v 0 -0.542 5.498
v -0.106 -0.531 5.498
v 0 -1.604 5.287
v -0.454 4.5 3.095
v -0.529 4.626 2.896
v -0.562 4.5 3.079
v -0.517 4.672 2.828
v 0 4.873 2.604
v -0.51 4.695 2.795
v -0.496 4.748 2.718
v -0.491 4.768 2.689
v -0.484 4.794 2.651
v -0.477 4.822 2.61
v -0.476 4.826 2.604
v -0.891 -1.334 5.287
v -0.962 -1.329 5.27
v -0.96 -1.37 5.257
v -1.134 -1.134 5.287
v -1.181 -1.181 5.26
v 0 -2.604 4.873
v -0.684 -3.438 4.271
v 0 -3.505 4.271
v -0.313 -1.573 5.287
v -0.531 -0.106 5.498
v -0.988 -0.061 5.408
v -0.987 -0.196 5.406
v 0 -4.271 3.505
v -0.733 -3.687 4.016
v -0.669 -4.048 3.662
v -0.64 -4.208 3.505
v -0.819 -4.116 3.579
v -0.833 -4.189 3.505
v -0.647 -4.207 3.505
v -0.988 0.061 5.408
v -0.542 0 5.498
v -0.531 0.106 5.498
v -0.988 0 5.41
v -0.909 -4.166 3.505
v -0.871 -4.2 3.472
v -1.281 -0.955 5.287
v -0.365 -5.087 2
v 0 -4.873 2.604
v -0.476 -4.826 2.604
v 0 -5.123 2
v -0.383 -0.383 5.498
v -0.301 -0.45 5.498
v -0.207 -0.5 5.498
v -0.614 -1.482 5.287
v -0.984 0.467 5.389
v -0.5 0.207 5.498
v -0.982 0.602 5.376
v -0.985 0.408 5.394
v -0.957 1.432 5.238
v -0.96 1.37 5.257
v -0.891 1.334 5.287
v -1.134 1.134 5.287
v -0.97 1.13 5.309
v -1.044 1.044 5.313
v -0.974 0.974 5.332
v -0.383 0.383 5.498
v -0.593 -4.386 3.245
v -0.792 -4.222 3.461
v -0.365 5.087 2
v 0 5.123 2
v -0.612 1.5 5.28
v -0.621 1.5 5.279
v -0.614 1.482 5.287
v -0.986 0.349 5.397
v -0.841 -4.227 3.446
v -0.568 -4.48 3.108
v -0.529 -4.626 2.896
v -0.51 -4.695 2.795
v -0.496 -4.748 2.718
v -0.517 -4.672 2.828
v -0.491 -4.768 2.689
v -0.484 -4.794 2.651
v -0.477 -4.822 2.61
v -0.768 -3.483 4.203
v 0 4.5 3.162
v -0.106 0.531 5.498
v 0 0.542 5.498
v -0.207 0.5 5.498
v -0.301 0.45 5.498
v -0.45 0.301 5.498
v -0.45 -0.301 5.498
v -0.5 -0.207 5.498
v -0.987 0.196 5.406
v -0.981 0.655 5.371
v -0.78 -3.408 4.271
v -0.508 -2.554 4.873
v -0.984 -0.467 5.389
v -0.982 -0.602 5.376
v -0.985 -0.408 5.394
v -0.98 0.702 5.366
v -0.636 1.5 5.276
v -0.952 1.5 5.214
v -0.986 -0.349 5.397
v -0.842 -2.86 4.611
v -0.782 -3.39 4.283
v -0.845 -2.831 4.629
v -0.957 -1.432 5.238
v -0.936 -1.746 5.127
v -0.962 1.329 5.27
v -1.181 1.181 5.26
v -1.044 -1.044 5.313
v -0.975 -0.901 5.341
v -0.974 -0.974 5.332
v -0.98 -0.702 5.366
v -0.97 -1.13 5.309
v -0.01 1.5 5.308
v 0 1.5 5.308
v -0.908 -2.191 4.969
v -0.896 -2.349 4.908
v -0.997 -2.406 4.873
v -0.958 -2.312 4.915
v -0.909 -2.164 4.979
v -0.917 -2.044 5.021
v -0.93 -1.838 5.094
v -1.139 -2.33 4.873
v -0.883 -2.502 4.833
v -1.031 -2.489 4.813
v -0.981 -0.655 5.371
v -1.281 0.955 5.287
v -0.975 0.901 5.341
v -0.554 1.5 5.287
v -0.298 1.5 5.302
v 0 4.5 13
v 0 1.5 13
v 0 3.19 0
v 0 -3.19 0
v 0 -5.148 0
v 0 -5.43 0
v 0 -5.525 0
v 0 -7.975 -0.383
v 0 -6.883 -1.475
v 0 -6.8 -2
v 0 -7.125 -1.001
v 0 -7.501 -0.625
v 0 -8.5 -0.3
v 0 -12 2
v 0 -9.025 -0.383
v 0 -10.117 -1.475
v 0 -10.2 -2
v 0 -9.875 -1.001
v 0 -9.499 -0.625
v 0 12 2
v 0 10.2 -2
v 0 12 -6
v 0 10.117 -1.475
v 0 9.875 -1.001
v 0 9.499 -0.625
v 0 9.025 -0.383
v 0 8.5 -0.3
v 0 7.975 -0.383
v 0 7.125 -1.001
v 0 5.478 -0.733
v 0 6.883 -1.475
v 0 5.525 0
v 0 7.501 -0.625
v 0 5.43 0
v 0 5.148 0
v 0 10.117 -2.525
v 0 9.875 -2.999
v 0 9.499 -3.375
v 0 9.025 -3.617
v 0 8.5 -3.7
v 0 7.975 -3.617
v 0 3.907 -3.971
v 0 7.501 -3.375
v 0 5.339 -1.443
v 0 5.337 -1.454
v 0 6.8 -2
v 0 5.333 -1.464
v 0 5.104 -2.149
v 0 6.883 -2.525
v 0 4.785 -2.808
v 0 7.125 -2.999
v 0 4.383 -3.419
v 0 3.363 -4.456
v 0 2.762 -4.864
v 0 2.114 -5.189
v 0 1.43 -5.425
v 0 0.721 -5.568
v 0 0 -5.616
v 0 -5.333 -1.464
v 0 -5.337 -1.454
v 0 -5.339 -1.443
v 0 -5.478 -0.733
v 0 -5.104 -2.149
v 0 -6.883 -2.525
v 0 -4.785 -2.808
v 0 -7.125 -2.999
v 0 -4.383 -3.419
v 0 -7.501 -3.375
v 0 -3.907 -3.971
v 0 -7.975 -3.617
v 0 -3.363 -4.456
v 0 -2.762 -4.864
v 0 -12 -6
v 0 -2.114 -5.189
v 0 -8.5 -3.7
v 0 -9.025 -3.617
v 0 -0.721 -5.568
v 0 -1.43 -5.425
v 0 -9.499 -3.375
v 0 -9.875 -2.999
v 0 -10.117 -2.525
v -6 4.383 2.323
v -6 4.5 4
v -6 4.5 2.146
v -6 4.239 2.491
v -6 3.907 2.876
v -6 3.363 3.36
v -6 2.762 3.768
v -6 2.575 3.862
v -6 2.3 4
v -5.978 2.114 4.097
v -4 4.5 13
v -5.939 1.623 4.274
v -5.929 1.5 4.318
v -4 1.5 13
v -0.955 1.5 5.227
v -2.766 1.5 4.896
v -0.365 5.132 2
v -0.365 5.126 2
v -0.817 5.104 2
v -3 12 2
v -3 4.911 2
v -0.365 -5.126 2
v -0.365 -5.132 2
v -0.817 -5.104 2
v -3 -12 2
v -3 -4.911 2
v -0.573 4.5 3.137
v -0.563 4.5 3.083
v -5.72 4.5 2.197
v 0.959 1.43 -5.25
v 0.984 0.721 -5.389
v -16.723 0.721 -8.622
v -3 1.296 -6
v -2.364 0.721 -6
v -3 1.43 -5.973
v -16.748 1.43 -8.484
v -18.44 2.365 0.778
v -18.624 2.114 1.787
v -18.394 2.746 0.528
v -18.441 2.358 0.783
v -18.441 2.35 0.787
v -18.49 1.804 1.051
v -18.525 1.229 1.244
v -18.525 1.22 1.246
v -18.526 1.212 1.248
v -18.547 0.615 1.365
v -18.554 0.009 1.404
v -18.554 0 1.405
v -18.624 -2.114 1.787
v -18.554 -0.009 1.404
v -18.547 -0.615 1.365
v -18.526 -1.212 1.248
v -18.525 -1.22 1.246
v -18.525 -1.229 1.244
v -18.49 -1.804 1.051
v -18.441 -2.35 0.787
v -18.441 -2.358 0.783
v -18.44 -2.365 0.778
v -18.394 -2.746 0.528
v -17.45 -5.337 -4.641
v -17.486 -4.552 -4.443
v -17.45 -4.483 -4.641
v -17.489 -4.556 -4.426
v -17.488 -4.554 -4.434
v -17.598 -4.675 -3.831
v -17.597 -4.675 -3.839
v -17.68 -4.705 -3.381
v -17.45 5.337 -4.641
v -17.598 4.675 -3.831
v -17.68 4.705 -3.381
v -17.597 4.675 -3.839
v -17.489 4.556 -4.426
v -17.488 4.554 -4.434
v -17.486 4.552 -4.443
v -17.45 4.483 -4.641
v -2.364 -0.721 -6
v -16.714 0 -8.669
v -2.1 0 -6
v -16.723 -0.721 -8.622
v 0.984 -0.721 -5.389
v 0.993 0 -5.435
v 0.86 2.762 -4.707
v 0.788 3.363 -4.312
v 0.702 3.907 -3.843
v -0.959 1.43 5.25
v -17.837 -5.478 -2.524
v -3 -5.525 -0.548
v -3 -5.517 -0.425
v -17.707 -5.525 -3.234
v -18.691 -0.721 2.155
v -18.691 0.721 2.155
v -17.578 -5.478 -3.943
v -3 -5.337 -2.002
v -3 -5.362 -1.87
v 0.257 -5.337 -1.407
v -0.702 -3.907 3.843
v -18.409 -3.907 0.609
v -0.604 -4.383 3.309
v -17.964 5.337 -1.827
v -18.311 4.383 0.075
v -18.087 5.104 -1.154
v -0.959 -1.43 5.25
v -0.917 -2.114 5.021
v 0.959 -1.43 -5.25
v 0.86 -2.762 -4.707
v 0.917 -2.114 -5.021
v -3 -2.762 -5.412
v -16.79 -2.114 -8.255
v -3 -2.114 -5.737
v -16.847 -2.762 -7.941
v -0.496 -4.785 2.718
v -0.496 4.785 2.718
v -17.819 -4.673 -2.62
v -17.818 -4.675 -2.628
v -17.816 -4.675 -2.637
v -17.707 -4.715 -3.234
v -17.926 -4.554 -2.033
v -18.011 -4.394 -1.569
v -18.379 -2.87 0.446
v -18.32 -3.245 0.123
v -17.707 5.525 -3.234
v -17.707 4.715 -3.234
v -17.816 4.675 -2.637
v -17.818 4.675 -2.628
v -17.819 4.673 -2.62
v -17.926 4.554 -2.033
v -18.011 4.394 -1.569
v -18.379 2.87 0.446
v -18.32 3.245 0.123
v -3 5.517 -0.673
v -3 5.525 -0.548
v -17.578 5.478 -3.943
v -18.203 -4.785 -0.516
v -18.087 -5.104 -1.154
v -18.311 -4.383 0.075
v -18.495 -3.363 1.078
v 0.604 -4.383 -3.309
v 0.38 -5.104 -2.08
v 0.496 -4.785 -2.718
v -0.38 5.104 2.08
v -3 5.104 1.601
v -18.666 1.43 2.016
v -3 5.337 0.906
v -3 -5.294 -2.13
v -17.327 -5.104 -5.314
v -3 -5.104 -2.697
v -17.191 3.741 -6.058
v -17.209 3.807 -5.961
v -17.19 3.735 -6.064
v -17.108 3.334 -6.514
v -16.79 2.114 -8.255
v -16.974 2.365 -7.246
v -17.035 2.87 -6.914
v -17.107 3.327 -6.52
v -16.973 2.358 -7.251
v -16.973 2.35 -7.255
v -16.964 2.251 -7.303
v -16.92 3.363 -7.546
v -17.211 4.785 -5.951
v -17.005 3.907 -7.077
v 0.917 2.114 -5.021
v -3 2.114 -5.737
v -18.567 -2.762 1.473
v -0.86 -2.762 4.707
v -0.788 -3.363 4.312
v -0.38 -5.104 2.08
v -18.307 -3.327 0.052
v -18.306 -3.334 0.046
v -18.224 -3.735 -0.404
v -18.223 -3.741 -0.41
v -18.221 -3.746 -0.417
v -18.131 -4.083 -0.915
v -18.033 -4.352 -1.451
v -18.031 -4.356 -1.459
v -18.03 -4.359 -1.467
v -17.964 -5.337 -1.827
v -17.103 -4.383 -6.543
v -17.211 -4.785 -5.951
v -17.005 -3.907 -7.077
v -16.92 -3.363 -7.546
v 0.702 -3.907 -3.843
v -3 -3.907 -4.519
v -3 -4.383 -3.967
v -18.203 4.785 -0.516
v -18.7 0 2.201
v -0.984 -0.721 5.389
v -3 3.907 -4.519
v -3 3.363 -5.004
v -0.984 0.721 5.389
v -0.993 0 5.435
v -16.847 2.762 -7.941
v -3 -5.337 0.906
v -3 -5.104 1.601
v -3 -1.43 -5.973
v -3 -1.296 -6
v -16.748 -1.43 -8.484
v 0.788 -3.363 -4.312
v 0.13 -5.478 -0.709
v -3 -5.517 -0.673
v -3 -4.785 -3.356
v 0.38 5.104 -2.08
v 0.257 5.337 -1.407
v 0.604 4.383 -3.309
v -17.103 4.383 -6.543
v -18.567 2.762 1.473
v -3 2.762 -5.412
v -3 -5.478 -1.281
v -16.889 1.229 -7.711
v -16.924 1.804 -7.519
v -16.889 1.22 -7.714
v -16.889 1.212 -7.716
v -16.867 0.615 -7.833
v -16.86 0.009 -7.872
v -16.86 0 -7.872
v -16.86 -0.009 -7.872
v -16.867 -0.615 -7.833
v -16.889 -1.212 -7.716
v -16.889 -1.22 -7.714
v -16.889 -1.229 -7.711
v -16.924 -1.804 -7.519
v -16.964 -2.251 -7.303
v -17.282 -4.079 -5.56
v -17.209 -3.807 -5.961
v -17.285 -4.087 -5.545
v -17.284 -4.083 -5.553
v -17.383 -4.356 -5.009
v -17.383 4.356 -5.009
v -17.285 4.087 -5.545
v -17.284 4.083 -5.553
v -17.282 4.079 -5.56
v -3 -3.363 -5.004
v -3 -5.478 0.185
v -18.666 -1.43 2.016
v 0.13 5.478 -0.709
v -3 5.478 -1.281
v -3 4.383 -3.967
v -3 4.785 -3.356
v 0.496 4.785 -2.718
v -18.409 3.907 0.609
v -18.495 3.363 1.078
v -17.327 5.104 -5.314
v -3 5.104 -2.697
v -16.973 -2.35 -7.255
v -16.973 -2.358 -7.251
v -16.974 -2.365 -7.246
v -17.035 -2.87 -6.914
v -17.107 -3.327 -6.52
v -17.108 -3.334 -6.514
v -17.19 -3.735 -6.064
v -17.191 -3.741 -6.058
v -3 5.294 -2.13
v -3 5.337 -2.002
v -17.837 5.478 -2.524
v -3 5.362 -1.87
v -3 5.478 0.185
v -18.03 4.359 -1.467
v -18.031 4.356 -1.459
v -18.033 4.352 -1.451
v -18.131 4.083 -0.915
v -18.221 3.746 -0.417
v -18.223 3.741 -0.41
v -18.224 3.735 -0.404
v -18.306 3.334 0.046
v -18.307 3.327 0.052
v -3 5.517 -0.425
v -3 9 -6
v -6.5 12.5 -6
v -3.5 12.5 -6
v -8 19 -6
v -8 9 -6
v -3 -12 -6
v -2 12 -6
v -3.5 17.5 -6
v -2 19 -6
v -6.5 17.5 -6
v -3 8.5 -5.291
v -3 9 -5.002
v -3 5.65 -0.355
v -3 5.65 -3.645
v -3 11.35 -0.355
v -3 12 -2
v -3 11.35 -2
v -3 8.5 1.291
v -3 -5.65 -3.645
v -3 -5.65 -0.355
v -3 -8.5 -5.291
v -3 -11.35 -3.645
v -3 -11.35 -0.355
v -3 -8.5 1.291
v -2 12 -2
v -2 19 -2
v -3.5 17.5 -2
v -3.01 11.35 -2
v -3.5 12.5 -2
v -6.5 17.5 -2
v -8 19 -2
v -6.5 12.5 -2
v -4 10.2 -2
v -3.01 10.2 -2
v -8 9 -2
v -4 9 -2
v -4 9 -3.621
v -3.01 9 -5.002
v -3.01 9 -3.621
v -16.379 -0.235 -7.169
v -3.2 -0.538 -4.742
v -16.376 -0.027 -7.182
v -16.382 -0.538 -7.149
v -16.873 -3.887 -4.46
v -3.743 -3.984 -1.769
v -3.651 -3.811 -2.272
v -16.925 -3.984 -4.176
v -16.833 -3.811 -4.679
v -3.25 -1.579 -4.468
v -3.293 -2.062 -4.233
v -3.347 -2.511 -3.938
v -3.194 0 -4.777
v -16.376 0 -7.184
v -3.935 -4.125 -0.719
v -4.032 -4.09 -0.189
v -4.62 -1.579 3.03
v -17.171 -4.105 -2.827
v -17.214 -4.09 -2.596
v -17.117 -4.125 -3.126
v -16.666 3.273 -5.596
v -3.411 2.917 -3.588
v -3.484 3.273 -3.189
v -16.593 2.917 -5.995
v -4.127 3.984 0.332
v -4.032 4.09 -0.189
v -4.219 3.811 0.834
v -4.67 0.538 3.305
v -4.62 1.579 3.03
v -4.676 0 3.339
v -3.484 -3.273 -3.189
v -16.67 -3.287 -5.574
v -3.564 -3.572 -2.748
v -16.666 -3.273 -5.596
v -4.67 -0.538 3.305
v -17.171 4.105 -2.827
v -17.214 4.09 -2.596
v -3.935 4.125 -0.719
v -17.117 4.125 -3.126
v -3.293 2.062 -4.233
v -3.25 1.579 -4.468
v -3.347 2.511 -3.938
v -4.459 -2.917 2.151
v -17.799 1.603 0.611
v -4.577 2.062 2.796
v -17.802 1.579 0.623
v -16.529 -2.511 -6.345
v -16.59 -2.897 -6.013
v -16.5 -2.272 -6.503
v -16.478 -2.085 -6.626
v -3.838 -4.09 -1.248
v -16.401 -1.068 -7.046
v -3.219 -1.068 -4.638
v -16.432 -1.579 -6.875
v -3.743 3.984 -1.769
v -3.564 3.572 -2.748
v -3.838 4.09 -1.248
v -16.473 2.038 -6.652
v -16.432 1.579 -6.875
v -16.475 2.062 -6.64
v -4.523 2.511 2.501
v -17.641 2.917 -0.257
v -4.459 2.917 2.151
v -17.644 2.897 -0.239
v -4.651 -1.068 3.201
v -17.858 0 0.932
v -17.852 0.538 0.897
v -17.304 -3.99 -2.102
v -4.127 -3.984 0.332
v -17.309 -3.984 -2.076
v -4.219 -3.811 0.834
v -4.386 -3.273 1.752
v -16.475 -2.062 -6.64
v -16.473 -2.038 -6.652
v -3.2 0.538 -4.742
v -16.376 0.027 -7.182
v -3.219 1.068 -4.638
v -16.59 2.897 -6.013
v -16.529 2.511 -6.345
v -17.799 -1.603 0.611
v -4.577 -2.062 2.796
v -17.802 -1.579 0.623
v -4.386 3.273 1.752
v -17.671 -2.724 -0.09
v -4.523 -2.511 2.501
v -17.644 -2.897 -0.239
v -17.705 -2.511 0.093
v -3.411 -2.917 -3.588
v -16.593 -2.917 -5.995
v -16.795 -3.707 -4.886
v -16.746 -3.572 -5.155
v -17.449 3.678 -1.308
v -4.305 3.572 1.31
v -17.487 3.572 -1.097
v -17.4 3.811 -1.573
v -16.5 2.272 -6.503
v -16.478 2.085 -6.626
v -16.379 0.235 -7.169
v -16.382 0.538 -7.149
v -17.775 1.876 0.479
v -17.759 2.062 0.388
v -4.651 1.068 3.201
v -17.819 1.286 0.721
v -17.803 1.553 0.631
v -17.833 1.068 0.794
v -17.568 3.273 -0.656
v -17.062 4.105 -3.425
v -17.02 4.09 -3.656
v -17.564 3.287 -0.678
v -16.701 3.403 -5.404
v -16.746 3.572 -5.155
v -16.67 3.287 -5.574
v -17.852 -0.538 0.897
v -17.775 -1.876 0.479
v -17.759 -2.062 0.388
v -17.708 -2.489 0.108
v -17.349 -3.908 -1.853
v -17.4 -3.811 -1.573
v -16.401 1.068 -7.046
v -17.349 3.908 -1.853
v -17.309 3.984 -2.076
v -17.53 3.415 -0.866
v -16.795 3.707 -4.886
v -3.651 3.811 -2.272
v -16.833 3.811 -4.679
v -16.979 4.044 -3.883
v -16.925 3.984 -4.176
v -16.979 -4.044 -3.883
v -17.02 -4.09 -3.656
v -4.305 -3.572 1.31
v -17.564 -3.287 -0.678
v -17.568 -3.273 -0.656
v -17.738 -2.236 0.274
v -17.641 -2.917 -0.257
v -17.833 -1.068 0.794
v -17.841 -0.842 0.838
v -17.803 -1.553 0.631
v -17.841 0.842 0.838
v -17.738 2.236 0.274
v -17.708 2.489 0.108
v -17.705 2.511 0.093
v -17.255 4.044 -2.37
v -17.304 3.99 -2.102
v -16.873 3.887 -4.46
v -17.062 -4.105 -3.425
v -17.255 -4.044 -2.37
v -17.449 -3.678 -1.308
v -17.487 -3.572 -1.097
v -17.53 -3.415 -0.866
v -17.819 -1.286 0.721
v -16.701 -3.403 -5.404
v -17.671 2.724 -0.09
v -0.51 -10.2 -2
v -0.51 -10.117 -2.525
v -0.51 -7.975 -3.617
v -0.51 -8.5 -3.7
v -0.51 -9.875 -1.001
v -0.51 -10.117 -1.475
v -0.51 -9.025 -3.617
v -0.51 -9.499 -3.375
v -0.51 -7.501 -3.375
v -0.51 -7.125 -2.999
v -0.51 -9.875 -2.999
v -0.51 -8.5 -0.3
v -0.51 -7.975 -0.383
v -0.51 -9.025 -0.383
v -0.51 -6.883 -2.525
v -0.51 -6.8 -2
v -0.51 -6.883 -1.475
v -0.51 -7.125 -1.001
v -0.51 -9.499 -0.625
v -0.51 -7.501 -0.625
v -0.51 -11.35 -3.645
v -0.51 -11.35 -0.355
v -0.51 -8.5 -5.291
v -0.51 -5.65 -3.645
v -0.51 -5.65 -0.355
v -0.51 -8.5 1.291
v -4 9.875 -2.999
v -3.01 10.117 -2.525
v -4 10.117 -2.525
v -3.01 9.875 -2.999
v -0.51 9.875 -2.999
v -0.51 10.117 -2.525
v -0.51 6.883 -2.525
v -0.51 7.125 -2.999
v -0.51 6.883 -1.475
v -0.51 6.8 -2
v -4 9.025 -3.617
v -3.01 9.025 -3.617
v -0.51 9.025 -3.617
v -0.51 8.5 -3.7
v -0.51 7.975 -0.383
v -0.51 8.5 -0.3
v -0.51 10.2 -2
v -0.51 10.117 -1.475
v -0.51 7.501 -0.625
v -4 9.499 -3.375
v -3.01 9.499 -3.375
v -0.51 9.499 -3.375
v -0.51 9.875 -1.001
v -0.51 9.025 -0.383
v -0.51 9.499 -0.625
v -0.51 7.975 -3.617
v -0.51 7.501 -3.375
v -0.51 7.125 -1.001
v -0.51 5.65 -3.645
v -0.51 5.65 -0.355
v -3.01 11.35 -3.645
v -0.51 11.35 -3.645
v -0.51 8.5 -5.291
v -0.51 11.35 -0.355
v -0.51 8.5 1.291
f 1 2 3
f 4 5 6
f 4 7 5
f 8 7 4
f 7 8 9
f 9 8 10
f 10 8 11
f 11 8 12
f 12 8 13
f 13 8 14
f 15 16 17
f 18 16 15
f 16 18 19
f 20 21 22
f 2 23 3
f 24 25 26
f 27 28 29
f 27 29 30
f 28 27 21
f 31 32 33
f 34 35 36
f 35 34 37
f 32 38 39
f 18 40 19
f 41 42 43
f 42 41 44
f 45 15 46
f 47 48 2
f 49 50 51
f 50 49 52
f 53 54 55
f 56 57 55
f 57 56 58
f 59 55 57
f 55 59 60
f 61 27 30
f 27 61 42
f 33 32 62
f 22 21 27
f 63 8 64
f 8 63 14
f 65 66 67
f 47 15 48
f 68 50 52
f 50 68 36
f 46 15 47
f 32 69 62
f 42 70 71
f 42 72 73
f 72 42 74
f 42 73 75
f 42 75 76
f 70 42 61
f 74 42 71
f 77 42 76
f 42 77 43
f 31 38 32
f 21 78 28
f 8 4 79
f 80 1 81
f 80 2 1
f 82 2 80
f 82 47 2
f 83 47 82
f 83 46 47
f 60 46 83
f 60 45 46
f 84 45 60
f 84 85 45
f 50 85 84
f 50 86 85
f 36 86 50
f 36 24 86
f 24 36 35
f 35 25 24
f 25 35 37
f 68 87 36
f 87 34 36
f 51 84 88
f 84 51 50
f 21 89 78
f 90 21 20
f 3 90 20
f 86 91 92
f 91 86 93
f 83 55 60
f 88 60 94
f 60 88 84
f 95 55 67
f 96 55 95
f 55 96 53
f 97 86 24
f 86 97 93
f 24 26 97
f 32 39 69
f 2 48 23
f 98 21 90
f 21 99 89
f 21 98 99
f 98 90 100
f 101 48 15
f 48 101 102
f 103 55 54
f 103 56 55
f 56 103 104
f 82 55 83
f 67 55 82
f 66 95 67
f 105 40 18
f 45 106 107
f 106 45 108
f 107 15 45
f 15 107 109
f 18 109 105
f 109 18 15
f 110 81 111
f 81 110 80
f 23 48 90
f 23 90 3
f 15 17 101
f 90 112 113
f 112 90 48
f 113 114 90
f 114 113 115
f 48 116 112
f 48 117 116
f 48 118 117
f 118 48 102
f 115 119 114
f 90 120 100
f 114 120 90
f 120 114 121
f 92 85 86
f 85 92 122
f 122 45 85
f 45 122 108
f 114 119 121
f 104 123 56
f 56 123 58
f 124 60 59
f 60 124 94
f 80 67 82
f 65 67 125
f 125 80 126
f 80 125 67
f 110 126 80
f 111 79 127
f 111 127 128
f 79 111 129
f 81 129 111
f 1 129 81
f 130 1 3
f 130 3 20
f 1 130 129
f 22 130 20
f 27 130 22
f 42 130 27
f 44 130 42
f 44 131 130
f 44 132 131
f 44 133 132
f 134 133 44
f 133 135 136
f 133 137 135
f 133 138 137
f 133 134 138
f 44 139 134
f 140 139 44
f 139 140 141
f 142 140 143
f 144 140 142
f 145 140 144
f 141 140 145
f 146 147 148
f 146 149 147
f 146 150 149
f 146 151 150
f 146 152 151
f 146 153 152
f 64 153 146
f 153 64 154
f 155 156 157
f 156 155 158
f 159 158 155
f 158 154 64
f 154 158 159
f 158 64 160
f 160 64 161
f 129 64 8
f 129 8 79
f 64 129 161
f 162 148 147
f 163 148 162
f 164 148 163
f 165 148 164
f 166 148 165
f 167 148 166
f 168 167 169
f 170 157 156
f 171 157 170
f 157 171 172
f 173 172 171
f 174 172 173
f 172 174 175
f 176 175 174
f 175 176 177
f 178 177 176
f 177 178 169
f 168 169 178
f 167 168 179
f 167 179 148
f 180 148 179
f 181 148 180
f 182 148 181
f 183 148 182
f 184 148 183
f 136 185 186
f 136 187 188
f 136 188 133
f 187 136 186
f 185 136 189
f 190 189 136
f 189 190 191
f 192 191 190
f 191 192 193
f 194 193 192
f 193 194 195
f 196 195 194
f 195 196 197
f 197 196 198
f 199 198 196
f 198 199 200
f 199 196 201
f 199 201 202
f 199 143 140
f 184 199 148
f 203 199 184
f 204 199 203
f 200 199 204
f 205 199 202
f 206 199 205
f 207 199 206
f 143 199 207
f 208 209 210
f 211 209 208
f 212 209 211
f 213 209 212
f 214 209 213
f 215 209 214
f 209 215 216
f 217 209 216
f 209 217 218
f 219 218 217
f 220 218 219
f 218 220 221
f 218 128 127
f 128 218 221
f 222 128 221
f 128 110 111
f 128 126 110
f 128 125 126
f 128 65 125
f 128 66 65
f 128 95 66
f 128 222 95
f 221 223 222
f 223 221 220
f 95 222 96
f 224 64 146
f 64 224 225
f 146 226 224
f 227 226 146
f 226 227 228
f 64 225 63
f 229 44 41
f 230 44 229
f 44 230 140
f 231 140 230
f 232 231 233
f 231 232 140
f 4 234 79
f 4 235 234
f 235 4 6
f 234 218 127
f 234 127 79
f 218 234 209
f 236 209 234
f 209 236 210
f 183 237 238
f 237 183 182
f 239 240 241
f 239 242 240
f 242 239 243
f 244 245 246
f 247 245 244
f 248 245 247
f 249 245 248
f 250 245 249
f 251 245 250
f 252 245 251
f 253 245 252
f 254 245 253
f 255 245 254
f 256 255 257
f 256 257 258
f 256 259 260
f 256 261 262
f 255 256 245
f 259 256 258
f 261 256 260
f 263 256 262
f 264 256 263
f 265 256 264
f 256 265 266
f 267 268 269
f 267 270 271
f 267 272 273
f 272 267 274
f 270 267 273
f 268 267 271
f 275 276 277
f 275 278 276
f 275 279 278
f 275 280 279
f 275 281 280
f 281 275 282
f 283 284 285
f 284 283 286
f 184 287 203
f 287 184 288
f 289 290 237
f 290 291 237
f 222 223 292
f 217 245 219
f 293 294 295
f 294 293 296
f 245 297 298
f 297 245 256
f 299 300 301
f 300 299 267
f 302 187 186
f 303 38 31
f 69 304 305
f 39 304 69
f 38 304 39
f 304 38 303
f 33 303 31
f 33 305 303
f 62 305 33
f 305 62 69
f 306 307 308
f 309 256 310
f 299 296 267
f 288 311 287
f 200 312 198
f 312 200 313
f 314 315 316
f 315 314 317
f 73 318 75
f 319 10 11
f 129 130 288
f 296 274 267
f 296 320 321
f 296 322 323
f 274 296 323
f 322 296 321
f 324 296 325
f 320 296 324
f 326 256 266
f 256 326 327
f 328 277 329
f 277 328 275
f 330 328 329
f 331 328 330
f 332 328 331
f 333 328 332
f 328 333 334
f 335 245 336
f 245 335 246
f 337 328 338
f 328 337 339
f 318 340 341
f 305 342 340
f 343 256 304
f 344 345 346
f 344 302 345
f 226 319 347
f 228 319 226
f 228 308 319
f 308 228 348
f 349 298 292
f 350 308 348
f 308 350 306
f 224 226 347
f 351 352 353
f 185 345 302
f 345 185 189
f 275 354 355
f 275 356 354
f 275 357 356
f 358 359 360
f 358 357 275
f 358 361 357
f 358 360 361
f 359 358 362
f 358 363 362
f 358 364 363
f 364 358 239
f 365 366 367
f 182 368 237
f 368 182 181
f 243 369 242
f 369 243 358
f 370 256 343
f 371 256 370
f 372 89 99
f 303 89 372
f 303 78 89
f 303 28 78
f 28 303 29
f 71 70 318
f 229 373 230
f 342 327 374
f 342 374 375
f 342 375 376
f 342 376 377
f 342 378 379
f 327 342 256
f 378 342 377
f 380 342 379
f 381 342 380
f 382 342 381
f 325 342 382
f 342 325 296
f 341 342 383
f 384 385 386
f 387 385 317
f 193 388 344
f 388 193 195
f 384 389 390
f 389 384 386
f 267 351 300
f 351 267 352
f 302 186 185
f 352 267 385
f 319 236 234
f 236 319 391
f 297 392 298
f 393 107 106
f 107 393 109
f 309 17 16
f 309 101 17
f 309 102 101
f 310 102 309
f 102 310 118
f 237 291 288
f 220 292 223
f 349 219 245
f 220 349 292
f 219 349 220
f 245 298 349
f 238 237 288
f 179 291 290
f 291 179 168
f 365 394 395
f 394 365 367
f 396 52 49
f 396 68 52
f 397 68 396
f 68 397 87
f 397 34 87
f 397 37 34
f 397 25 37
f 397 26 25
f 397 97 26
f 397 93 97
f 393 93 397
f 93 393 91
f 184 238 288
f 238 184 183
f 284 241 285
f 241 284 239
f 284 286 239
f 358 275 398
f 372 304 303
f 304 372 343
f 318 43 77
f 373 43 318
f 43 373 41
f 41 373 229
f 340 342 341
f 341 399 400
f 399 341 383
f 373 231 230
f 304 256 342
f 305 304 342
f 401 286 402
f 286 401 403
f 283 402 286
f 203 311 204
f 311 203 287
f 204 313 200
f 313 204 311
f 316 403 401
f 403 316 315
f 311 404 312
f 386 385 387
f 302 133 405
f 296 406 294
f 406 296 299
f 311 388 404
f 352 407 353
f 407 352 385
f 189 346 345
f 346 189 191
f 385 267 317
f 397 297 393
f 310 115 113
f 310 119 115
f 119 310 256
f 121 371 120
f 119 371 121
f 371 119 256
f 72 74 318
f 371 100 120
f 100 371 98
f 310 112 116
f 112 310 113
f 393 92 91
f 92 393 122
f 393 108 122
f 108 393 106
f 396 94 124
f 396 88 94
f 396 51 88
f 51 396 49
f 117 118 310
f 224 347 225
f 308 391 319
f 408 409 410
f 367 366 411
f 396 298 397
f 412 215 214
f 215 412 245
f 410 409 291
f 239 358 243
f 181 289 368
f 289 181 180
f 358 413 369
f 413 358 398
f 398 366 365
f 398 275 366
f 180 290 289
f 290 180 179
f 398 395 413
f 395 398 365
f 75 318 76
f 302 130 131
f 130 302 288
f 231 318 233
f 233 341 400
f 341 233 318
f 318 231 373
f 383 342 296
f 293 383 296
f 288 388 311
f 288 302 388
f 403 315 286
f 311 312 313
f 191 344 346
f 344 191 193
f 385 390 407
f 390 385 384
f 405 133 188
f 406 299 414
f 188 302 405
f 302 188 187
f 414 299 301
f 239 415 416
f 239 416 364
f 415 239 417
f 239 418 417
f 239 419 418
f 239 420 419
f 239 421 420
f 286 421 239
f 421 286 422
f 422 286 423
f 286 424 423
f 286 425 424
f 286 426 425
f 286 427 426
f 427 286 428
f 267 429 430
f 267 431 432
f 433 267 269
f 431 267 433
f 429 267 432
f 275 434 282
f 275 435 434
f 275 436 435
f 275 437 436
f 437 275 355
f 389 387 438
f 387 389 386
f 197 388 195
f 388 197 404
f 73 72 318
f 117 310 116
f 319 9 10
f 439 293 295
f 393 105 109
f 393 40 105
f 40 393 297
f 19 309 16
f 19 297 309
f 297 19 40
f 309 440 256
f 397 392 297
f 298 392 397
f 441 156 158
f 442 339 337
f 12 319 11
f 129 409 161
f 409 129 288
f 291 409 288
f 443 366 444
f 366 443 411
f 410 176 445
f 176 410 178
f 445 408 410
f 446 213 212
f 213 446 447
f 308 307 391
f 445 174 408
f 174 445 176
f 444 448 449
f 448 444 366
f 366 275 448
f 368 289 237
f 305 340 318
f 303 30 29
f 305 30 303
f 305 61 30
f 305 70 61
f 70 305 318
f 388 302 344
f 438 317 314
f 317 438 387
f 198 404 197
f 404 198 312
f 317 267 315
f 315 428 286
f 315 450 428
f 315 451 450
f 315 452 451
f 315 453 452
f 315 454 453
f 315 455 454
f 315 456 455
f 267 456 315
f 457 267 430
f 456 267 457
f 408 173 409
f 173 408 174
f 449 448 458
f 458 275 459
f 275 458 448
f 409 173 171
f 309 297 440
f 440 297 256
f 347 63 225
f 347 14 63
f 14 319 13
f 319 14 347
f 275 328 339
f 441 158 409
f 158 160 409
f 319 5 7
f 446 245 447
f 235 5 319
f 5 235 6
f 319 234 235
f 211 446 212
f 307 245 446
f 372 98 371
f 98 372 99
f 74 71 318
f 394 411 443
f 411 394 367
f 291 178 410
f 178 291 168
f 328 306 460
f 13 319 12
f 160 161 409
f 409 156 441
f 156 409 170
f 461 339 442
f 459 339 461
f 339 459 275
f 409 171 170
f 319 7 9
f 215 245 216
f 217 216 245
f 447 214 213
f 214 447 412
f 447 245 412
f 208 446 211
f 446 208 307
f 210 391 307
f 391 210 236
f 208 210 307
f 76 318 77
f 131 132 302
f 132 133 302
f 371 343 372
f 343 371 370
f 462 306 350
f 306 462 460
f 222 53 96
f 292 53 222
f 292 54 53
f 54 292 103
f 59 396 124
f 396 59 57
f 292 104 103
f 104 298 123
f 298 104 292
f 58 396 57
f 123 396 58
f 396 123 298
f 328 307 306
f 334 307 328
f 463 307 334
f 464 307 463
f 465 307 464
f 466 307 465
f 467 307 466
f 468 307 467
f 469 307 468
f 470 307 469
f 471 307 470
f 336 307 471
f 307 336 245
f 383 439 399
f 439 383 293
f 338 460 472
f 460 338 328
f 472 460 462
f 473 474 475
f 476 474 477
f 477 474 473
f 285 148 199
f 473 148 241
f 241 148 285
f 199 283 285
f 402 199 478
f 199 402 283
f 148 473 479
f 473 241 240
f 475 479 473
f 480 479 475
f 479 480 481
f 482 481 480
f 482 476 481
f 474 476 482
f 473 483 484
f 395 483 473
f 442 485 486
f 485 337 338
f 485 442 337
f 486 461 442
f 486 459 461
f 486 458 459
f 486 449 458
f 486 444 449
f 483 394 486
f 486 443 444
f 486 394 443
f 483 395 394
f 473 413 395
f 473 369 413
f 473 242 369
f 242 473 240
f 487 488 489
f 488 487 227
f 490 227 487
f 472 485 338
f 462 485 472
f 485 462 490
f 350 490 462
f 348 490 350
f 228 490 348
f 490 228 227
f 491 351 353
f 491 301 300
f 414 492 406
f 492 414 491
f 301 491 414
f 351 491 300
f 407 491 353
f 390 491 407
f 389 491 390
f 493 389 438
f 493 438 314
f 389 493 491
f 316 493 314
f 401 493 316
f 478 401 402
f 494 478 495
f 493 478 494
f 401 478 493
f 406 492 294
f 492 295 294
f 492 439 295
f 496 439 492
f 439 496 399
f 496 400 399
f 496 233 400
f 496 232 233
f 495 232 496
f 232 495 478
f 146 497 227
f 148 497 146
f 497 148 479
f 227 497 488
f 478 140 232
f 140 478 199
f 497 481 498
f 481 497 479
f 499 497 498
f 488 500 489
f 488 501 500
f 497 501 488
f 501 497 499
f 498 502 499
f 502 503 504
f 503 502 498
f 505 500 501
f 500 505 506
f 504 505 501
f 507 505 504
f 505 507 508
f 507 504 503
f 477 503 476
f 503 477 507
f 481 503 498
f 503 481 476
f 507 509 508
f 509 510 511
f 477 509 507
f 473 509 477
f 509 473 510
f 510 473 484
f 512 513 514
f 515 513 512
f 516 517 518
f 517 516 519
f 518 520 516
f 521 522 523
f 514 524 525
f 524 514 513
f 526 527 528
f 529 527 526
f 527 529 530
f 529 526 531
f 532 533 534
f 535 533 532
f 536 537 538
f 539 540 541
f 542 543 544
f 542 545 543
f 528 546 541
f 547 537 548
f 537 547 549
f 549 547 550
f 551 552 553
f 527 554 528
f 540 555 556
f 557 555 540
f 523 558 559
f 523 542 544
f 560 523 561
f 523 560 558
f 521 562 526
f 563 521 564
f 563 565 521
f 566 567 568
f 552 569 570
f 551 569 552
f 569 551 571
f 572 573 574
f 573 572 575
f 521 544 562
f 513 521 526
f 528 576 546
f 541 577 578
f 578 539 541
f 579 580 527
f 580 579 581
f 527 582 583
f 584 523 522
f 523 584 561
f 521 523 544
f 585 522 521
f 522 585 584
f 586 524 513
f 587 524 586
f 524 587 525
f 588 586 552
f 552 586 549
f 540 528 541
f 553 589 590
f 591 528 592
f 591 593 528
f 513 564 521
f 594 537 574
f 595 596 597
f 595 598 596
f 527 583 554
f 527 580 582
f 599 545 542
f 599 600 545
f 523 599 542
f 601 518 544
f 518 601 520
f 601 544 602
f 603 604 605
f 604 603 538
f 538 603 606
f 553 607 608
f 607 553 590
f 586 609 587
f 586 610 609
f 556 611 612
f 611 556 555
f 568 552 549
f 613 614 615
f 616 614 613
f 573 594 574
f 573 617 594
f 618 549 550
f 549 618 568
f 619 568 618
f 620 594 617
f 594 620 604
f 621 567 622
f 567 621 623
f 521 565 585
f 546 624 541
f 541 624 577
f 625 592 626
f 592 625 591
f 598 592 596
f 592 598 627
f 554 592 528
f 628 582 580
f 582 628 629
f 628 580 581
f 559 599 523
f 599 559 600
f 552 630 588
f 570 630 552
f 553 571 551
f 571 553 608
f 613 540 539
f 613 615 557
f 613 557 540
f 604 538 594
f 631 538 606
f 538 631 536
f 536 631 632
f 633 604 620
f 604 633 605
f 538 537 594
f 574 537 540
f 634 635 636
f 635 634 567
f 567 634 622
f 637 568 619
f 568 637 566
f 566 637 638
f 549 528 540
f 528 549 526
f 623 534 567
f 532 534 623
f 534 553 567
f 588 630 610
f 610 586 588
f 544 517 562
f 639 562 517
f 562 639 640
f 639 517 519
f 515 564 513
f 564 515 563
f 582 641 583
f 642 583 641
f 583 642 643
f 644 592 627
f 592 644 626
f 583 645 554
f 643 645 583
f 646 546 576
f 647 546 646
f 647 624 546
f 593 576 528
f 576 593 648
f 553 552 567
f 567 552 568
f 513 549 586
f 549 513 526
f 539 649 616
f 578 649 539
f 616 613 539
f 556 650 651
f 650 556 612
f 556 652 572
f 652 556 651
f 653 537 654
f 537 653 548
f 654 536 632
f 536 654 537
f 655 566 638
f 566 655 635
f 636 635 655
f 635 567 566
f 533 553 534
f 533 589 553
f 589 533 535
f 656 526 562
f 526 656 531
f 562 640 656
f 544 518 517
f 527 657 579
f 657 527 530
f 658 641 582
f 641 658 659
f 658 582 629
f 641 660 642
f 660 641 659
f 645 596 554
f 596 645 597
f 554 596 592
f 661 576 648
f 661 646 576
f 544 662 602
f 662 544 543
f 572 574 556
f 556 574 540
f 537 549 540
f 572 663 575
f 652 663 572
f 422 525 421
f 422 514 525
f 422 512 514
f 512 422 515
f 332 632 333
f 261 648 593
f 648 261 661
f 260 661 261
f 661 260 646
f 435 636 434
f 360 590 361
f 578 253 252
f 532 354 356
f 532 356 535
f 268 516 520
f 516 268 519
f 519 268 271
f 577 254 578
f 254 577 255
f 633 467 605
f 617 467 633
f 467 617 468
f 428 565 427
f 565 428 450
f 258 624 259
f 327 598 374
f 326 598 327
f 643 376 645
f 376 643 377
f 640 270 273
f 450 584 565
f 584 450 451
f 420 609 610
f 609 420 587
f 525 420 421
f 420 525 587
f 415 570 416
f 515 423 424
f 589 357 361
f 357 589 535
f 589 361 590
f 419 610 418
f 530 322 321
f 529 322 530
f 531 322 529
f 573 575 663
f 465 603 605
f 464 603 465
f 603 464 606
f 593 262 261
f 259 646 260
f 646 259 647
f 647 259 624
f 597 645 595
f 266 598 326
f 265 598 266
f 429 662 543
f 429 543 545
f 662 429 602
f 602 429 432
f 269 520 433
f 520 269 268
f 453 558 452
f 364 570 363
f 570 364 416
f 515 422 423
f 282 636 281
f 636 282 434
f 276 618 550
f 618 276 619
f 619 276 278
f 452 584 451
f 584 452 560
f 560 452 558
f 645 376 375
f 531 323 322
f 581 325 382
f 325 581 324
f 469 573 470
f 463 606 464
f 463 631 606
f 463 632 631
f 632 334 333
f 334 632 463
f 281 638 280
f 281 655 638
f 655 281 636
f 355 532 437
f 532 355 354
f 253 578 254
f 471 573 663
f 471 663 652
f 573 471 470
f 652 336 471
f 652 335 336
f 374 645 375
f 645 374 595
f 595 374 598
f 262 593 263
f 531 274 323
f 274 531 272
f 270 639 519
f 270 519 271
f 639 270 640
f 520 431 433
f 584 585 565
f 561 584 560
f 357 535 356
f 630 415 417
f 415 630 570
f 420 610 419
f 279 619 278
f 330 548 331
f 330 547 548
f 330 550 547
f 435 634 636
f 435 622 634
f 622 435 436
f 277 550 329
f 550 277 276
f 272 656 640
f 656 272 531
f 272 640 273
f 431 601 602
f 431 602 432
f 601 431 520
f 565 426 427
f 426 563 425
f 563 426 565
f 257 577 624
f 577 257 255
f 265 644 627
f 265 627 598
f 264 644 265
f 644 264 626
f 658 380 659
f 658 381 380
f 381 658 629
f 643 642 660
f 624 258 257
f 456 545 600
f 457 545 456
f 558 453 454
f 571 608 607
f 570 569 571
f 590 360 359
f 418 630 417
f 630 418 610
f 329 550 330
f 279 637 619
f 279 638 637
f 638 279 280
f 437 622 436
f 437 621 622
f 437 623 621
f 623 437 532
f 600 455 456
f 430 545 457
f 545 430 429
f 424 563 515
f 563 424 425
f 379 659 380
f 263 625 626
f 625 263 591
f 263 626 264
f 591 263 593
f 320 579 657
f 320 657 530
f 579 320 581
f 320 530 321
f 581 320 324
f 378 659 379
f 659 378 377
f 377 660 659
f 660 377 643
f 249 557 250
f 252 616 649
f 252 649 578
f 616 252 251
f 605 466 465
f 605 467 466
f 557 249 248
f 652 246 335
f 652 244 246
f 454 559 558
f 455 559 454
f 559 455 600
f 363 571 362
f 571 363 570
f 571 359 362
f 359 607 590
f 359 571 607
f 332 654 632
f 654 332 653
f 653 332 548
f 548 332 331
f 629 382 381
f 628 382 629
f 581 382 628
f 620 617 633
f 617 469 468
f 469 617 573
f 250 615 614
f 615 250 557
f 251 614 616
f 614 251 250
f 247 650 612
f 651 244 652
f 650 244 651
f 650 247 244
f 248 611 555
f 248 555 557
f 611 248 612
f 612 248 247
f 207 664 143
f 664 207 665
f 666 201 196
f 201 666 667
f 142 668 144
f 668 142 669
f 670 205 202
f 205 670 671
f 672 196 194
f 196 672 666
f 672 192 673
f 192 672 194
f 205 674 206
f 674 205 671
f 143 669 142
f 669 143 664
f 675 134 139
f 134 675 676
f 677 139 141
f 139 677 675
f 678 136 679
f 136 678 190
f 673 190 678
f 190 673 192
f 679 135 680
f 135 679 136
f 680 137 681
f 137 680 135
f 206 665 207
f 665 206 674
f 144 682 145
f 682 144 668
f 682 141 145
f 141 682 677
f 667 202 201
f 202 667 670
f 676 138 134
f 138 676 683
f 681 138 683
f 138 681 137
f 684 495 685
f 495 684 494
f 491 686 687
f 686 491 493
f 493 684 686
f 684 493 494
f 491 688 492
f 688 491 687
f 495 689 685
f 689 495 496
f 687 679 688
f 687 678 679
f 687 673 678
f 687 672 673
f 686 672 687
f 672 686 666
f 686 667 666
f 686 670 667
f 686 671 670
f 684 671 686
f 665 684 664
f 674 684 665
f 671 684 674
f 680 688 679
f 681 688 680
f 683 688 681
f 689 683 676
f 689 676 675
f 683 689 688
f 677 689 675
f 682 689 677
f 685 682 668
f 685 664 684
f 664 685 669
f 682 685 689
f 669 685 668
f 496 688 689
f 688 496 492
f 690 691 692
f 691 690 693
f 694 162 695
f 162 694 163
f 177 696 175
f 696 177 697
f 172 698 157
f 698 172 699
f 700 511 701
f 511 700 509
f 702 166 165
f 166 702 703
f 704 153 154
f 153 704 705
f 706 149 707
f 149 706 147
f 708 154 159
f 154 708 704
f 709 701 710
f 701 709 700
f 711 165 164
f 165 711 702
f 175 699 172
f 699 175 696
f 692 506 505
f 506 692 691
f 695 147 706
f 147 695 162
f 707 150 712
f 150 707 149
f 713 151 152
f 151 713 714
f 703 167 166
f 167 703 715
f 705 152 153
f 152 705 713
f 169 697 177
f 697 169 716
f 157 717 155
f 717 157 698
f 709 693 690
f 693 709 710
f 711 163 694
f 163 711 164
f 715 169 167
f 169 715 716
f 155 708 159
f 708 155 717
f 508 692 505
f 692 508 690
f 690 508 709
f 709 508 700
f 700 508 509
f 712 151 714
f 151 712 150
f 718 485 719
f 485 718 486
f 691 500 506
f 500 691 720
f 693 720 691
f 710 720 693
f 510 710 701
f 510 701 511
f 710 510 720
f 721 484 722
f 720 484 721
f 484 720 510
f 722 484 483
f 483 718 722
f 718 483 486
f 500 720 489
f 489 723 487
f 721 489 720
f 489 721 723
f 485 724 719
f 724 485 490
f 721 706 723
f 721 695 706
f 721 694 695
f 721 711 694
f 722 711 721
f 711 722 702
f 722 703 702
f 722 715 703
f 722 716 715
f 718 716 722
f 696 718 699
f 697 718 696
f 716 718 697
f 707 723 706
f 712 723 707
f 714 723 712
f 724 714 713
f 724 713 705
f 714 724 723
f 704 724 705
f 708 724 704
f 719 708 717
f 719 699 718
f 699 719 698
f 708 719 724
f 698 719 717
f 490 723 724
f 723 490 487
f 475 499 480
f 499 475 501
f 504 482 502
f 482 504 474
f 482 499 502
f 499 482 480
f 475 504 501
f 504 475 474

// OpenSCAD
// H08b_vertex_half  (qty 1; frame: node; MJF PA12; print service OK)
// GENERATED by gen_halo_stl.py from halo_parts.py. Change numbers in halo_params.scad.
// Every dimension below is an expression of the names in halo_params.scad.
include <../halo_params.scad>

difference() {
    union() {
        translate([0, 0, 0]) {
            rotate([0, acos(((SOCK_BOT + SOCK_DEPTH) * (-sin(CH_DEG / 2)) - 0) / sqrt(((SOCK_BOT + SOCK_DEPTH) * (-1 * cos(CH_DEG / 2)) - 0) * ((SOCK_BOT + SOCK_DEPTH) * (-1 * cos(CH_DEG / 2)) - 0) + ((SOCK_BOT + SOCK_DEPTH) * 0 - 0) * ((SOCK_BOT + SOCK_DEPTH) * 0 - 0) + ((SOCK_BOT + SOCK_DEPTH) * (-sin(CH_DEG / 2)) - 0) * ((SOCK_BOT + SOCK_DEPTH) * (-sin(CH_DEG / 2)) - 0))), atan2((SOCK_BOT + SOCK_DEPTH) * 0 - 0, (SOCK_BOT + SOCK_DEPTH) * (-1 * cos(CH_DEG / 2)) - 0)]) {
                cylinder(h = sqrt(((SOCK_BOT + SOCK_DEPTH) * (-1 * cos(CH_DEG / 2)) - 0) * ((SOCK_BOT + SOCK_DEPTH) * (-1 * cos(CH_DEG / 2)) - 0) + ((SOCK_BOT + SOCK_DEPTH) * 0 - 0) * ((SOCK_BOT + SOCK_DEPTH) * 0 - 0) + ((SOCK_BOT + SOCK_DEPTH) * (-sin(CH_DEG / 2)) - 0) * ((SOCK_BOT + SOCK_DEPTH) * (-sin(CH_DEG / 2)) - 0)), r = SOCK_D / 2 + SOCK_WALL, center = false, $fn = 48);
            }
        }
        intersection() {
            sphere(r = SOCK_D / 2 + SOCK_WALL, $fn = 32);
            translate([-10, -10, -10]) {
                cube([10, 20, 20], center = false);
            }
        }
        translate([-3, -12, -6]) {
            cube([3, 24, 8], center = false);
        }
        intersection() {
            hull() {
                translate([-4, -POST_N1, 2]) {
                    cube([4, -POST_N0 - (-POST_N1), TUBE_OD / 2 + POST_H - 2], center = false);
                }
                translate([-6, -POST_N1, 2]) {
                    cube([8, -POST_N0 - (-POST_N1), 2], center = false);
                }
            }
            translate([-20, -20, -5]) {
                cube([20, 40, 35], center = false);
            }
        }
        translate([-8, 9, -6]) {
            cube([6, 10, 4], center = false);
        }
    }
    translate([SOCK_BOT * (-1 * cos(CH_DEG / 2)), SOCK_BOT * 0, SOCK_BOT * (-sin(CH_DEG / 2))]) {
        rotate([0, acos(((SOCK_BOT + SOCK_DEPTH + 0.1) * (-sin(CH_DEG / 2)) - (SOCK_BOT * (-sin(CH_DEG / 2)))) / sqrt(((SOCK_BOT + SOCK_DEPTH + 0.1) * (-1 * cos(CH_DEG / 2)) - (SOCK_BOT * (-1 * cos(CH_DEG / 2)))) * ((SOCK_BOT + SOCK_DEPTH + 0.1) * (-1 * cos(CH_DEG / 2)) - (SOCK_BOT * (-1 * cos(CH_DEG / 2)))) + ((SOCK_BOT + SOCK_DEPTH + 0.1) * 0 - (SOCK_BOT * 0)) * ((SOCK_BOT + SOCK_DEPTH + 0.1) * 0 - (SOCK_BOT * 0)) + ((SOCK_BOT + SOCK_DEPTH + 0.1) * (-sin(CH_DEG / 2)) - (SOCK_BOT * (-sin(CH_DEG / 2)))) * ((SOCK_BOT + SOCK_DEPTH + 0.1) * (-sin(CH_DEG / 2)) - (SOCK_BOT * (-sin(CH_DEG / 2)))))), atan2((SOCK_BOT + SOCK_DEPTH + 0.1) * 0 - (SOCK_BOT * 0), (SOCK_BOT + SOCK_DEPTH + 0.1) * (-1 * cos(CH_DEG / 2)) - (SOCK_BOT * (-1 * cos(CH_DEG / 2))))]) {
            cylinder(h = sqrt(((SOCK_BOT + SOCK_DEPTH + 0.1) * (-1 * cos(CH_DEG / 2)) - (SOCK_BOT * (-1 * cos(CH_DEG / 2)))) * ((SOCK_BOT + SOCK_DEPTH + 0.1) * (-1 * cos(CH_DEG / 2)) - (SOCK_BOT * (-1 * cos(CH_DEG / 2)))) + ((SOCK_BOT + SOCK_DEPTH + 0.1) * 0 - (SOCK_BOT * 0)) * ((SOCK_BOT + SOCK_DEPTH + 0.1) * 0 - (SOCK_BOT * 0)) + ((SOCK_BOT + SOCK_DEPTH + 0.1) * (-sin(CH_DEG / 2)) - (SOCK_BOT * (-sin(CH_DEG / 2)))) * ((SOCK_BOT + SOCK_DEPTH + 0.1) * (-sin(CH_DEG / 2)) - (SOCK_BOT * (-sin(CH_DEG / 2))))), r = SOCK_D / 2, center = false, $fn = 48);
        }
    }
    translate([(SOCK_BOT + SOCK_DEPTH - 0.6) * (-1 * cos(CH_DEG / 2)), (SOCK_BOT + SOCK_DEPTH - 0.6) * 0, (SOCK_BOT + SOCK_DEPTH - 0.6) * (-sin(CH_DEG / 2))]) {
        rotate([0, acos(((SOCK_BOT + SOCK_DEPTH + 0.01) * (-sin(CH_DEG / 2)) - ((SOCK_BOT + SOCK_DEPTH - 0.6) * (-sin(CH_DEG / 2)))) / sqrt(((SOCK_BOT + SOCK_DEPTH + 0.01) * (-1 * cos(CH_DEG / 2)) - ((SOCK_BOT + SOCK_DEPTH - 0.6) * (-1 * cos(CH_DEG / 2)))) * ((SOCK_BOT + SOCK_DEPTH + 0.01) * (-1 * cos(CH_DEG / 2)) - ((SOCK_BOT + SOCK_DEPTH - 0.6) * (-1 * cos(CH_DEG / 2)))) + ((SOCK_BOT + SOCK_DEPTH + 0.01) * 0 - ((SOCK_BOT + SOCK_DEPTH - 0.6) * 0)) * ((SOCK_BOT + SOCK_DEPTH + 0.01) * 0 - ((SOCK_BOT + SOCK_DEPTH - 0.6) * 0)) + ((SOCK_BOT + SOCK_DEPTH + 0.01) * (-sin(CH_DEG / 2)) - ((SOCK_BOT + SOCK_DEPTH - 0.6) * (-sin(CH_DEG / 2)))) * ((SOCK_BOT + SOCK_DEPTH + 0.01) * (-sin(CH_DEG / 2)) - ((SOCK_BOT + SOCK_DEPTH - 0.6) * (-sin(CH_DEG / 2)))))), atan2((SOCK_BOT + SOCK_DEPTH + 0.01) * 0 - ((SOCK_BOT + SOCK_DEPTH - 0.6) * 0), (SOCK_BOT + SOCK_DEPTH + 0.01) * (-1 * cos(CH_DEG / 2)) - ((SOCK_BOT + SOCK_DEPTH - 0.6) * (-1 * cos(CH_DEG / 2))))]) {
            cylinder(h = sqrt(((SOCK_BOT + SOCK_DEPTH + 0.01) * (-1 * cos(CH_DEG / 2)) - ((SOCK_BOT + SOCK_DEPTH - 0.6) * (-1 * cos(CH_DEG / 2)))) * ((SOCK_BOT + SOCK_DEPTH + 0.01) * (-1 * cos(CH_DEG / 2)) - ((SOCK_BOT + SOCK_DEPTH - 0.6) * (-1 * cos(CH_DEG / 2)))) + ((SOCK_BOT + SOCK_DEPTH + 0.01) * 0 - ((SOCK_BOT + SOCK_DEPTH - 0.6) * 0)) * ((SOCK_BOT + SOCK_DEPTH + 0.01) * 0 - ((SOCK_BOT + SOCK_DEPTH - 0.6) * 0)) + ((SOCK_BOT + SOCK_DEPTH + 0.01) * (-sin(CH_DEG / 2)) - ((SOCK_BOT + SOCK_DEPTH - 0.6) * (-sin(CH_DEG / 2)))) * ((SOCK_BOT + SOCK_DEPTH + 0.01) * (-sin(CH_DEG / 2)) - ((SOCK_BOT + SOCK_DEPTH - 0.6) * (-sin(CH_DEG / 2))))), r1 = SOCK_D / 2, r2 = SOCK_D / 2 + 0.6, center = false, $fn = 48);
        }
    }
    translate([-4, -8.5, -2]) {
        rotate([0, 90, 0]) {
            cylinder(h = 8, r = M3_CLEAR / 2, center = false, $fn = 20);
        }
    }
    translate([-3.01, -8.5, -2]) {
        rotate([0, 90, 0]) {
            cylinder(h = 2.5, r = (M3_NUT_AF + 0.2) / 1.732051, center = false, $fn = 6);
        }
    }
    translate([-4, 8.5, -2]) {
        rotate([0, 90, 0]) {
            cylinder(h = 8, r = M3_CLEAR / 2, center = false, $fn = 20);
        }
    }
    translate([-3.01, 8.5, -2]) {
        rotate([0, 90, 0]) {
            cylinder(h = 2.5, r = (M3_NUT_AF + 0.2) / 1.732051, center = false, $fn = 6);
        }
    }
    translate([-6.5, 12.5, -6.1]) {
        cube([3, 5, 4.2], center = false);
    }
}
